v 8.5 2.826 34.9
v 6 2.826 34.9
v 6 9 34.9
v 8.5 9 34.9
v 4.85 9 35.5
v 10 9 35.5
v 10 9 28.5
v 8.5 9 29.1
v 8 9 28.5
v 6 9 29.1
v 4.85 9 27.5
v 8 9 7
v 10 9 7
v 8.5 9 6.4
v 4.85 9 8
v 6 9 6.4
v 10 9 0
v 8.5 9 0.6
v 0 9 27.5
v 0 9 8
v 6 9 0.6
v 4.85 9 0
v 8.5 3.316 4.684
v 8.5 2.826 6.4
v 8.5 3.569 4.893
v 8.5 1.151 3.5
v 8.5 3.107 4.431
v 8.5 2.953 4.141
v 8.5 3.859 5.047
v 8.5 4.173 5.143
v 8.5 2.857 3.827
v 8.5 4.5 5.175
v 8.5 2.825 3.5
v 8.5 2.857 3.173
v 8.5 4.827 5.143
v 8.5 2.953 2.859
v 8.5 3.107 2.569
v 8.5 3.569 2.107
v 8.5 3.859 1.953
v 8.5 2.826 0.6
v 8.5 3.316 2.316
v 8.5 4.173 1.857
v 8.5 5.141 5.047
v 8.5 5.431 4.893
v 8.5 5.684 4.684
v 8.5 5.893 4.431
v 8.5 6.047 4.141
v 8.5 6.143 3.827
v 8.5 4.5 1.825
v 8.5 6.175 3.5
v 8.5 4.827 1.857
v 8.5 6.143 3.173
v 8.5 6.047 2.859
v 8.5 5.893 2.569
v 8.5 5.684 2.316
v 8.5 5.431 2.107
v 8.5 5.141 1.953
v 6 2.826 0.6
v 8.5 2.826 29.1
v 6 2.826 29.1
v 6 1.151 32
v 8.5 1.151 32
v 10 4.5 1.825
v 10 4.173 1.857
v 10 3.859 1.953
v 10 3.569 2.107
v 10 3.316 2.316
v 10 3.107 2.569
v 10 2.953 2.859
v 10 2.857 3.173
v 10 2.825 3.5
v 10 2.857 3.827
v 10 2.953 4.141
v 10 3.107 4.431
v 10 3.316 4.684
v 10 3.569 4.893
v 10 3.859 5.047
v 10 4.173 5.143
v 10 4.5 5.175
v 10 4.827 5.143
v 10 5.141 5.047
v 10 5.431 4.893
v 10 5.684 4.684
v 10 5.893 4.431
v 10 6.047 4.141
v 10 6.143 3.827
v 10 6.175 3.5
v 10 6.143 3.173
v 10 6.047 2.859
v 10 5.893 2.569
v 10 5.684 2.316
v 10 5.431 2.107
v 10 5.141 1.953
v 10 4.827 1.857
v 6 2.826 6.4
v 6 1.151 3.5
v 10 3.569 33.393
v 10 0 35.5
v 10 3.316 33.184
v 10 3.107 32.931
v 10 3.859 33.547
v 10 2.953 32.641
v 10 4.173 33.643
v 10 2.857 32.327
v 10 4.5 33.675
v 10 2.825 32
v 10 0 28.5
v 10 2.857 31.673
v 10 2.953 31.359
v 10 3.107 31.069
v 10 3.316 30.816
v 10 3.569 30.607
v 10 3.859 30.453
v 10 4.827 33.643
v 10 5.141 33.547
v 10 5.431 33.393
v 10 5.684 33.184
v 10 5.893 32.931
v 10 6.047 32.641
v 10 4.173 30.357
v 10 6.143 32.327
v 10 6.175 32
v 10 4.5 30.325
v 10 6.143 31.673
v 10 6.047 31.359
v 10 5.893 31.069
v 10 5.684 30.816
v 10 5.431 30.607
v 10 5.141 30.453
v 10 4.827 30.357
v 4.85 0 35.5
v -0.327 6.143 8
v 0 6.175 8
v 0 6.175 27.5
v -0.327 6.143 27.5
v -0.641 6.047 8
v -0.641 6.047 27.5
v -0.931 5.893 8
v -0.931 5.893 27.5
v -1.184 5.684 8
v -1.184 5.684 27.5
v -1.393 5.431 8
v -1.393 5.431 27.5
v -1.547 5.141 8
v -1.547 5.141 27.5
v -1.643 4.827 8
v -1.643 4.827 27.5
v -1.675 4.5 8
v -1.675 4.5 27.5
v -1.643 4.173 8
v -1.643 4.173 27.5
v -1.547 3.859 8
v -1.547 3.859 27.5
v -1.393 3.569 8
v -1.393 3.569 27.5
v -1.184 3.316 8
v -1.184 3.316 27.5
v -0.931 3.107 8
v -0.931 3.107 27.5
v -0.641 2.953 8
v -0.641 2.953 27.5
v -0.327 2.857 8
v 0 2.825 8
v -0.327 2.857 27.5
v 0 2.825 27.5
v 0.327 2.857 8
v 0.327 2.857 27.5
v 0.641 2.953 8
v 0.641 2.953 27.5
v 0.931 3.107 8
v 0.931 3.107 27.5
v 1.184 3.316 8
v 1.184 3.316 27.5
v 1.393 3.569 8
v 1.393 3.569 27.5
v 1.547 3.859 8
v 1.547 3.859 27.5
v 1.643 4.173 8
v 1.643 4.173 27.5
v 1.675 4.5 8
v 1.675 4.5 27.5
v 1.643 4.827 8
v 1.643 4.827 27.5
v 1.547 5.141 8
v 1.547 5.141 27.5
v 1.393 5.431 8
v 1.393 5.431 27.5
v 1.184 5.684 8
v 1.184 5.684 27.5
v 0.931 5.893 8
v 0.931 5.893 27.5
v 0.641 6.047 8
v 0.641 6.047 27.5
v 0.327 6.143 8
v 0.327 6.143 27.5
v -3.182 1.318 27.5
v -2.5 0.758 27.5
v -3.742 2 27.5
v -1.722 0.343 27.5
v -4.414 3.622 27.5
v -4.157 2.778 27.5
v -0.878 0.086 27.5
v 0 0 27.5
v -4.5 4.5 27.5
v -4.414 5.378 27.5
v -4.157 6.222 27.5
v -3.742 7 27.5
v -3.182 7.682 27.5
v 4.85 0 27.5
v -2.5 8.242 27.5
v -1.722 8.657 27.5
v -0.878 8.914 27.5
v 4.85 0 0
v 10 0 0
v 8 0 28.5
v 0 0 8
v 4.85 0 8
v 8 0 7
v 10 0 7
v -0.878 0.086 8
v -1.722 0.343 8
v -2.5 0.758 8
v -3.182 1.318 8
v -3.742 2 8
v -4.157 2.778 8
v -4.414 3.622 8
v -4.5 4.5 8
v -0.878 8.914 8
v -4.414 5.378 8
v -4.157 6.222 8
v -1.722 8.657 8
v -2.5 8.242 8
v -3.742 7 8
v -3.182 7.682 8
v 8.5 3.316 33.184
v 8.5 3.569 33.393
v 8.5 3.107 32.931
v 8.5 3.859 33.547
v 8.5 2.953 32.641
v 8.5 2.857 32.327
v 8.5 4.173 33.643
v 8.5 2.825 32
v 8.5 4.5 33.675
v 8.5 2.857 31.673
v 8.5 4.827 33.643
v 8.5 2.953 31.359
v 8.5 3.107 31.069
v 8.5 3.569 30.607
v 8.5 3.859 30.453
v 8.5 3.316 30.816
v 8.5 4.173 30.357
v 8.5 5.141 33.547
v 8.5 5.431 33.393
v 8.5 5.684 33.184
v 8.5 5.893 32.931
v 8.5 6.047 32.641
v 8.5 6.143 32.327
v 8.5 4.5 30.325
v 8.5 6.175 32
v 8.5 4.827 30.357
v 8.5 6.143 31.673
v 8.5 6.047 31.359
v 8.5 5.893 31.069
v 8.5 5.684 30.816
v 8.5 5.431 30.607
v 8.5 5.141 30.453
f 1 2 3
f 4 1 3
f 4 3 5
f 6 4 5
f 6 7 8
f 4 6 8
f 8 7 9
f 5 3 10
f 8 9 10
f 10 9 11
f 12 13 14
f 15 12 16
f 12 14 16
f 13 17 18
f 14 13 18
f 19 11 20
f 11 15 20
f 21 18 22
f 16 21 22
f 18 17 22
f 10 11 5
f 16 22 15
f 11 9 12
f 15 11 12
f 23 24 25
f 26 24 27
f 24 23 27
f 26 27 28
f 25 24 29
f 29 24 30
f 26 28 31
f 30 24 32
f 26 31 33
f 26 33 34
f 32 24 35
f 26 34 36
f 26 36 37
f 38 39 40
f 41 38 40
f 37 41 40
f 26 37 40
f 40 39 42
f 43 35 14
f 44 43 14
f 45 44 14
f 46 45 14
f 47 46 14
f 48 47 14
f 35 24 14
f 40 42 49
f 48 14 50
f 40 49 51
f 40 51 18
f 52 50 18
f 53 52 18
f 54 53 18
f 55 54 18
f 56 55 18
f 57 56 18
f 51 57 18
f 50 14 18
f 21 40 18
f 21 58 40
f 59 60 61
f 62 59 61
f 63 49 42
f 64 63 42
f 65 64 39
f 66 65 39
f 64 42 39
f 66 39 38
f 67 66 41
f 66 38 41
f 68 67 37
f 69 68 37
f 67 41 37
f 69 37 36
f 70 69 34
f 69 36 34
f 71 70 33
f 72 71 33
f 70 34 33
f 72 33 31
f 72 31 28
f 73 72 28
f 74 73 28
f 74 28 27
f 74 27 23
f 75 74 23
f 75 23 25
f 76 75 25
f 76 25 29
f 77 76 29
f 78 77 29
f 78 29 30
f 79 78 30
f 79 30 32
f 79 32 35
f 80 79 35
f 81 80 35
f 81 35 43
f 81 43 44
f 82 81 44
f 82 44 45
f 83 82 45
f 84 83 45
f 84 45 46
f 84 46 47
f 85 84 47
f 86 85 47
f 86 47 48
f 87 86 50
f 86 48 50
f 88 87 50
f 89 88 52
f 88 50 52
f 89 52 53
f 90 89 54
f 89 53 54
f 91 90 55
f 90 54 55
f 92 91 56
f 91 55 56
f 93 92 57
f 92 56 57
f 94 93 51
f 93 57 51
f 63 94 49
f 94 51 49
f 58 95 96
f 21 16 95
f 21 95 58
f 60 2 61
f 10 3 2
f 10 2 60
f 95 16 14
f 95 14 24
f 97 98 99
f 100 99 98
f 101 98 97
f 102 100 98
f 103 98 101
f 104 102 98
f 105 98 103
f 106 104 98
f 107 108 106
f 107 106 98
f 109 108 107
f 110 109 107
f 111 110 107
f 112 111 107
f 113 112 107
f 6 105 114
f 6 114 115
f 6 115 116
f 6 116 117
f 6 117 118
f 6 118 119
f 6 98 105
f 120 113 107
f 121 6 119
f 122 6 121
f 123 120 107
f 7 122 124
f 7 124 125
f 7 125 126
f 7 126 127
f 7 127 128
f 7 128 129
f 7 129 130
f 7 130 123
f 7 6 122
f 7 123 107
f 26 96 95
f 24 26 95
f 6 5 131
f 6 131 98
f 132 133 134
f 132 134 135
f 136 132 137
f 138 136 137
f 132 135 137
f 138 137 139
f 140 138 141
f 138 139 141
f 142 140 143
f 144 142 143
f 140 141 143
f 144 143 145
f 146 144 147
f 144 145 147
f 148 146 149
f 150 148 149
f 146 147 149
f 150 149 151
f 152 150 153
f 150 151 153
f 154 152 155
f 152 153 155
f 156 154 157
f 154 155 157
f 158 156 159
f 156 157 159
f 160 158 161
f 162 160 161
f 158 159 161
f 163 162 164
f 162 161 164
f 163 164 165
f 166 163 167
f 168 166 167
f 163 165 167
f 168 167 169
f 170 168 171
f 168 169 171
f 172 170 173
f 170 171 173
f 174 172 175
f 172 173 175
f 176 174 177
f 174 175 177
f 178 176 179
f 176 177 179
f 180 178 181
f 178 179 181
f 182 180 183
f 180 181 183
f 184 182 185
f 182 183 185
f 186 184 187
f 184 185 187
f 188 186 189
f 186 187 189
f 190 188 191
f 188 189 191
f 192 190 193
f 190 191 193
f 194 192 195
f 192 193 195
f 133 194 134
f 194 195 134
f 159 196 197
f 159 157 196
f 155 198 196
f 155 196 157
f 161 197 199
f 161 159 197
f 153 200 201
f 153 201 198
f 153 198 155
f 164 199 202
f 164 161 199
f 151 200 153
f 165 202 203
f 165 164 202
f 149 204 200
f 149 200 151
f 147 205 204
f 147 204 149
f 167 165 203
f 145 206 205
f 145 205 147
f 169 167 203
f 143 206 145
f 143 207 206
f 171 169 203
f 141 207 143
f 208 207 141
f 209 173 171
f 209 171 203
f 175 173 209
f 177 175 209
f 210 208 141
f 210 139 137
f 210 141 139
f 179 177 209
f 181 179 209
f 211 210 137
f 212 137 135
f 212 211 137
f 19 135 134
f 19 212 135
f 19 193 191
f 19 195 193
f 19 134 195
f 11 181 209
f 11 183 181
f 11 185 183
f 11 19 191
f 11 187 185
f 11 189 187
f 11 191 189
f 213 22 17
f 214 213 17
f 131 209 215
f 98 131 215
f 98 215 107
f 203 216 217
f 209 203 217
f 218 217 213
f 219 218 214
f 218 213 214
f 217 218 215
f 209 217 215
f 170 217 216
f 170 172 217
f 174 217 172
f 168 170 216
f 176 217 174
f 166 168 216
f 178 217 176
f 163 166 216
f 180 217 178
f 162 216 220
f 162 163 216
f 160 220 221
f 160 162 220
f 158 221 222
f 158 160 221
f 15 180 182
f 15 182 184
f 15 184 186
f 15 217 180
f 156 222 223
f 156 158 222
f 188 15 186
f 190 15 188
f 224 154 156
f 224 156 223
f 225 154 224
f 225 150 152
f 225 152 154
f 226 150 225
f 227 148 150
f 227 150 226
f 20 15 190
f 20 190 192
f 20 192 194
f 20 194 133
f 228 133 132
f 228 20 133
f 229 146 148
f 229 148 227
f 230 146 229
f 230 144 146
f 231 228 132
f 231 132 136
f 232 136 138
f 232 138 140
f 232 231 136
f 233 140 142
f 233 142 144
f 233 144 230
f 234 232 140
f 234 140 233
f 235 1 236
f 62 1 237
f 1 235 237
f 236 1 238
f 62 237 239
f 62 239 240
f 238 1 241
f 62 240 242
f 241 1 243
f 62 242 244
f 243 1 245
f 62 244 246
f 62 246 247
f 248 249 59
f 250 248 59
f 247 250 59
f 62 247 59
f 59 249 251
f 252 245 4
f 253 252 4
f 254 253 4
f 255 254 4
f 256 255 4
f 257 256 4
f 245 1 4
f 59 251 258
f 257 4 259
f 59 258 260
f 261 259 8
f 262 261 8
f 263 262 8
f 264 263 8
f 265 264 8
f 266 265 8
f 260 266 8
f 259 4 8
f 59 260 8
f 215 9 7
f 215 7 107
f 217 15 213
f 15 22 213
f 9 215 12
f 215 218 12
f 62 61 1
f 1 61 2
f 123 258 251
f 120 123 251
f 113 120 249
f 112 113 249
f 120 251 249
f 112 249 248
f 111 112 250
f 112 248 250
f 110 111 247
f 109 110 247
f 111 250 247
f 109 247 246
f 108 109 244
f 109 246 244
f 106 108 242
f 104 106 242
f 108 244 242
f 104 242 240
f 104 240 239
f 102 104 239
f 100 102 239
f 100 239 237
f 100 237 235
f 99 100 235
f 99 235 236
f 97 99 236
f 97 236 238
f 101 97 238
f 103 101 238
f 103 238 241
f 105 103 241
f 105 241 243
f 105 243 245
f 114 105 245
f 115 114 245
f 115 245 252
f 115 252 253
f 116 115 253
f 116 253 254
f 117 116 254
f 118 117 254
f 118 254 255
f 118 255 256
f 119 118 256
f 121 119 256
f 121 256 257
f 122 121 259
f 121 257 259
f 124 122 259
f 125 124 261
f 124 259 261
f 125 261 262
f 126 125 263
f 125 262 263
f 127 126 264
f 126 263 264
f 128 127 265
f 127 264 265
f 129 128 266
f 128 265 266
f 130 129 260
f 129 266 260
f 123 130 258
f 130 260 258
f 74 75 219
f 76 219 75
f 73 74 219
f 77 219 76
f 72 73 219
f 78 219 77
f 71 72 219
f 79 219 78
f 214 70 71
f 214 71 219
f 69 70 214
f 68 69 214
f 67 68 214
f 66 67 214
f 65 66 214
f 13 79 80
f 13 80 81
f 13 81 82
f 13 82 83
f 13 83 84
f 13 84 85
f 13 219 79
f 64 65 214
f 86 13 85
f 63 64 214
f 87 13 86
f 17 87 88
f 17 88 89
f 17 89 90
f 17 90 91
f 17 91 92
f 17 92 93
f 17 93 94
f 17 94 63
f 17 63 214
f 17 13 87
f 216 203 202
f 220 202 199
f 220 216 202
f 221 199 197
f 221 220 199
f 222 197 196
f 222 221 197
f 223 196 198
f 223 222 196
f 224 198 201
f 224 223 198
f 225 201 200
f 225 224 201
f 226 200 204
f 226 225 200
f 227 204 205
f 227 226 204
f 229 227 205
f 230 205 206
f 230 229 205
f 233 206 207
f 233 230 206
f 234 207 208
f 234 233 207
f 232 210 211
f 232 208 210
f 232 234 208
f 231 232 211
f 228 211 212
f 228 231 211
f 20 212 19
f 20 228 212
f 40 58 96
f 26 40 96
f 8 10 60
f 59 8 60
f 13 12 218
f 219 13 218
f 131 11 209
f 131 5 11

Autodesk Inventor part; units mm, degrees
ref_plane "YZ Plane" through (0, 0, 0) normal (1, 0, 0) x (0, 1, 0)
ref_plane "XZ Plane" through (0, 0, 0) normal (0, 1, 0) x (-1, 0, 0)
ref_plane "XY Plane" through (0, 0, 0) normal (0, 0, 1) x (1, 0, 0)
sketch "Эскиз1" plane through (0, 0, 0) normal (0, 0, 1) x (1, 0, 0)
  line L0 (0, 0) -> (8, 0)
  line L1 (8, 0) -> (8, 9)
  line L2 (8, 9) -> (0, 9)
  line L3 (0, 9) -> (0, 0)
  circle A0 centre (0, 4.5) radius 4.5
  dimension "d0" = 8
  dimension "d1" = 9
extrude "Выдавливание1" add sketch "Эскиз1" along normal blind 35.5
sketch "Эскиз2" plane through (8, 0, 0) normal (1, 0, 0) x (0, 0, -1)
  line L0 (-35.5, 0) -> (-35.5, 9) projected
  line L1 (0, 0) -> (-35.5, 0) projected
  line L2 (-35.5, 9) -> (-28.5, 9)
  line L3 (-28.5, 9) -> (-28.5, 0)
  line L4 (-28.5, 0) -> (-35.5, 0)
  line L5 (-35.5, 0) -> (-35.5, 9)
  line L6 (0, 0) -> (0, 9) projected
  line L7 (0, 9) -> (-7, 9)
  line L8 (-7, 9) -> (-7, 0)
  line L9 (-7, 0) -> (0, 0)
  line L10 (0, 0) -> (0, 9)
  dimension "d4" = 7
  dimension "d5" = 7
extrude "Выдавливание2" add sketch "Эскиз2" along normal blind 2
sketch "Эскиз3" plane through (10, 0, 0) normal (1, 0, 0) x (0, 0, -1)
  line L0 (-35.5, 9) -> (-35.5, 0) projected
  line L1 (-35.5, 4.5) -> (-28.5, 4.5)
  line L2 (-28.5, 0) -> (-28.5, 9) projected
  line L3 (-7, 9) -> (-7, 0) projected
  line L4 (-7, 4.5) -> (0, 4.5)
  line L5 (0, 9) -> (0, 0) projected
  point P0 (-32, 4.5)
  point P1 (-3.5, 4.5)
hole "Отверстие1" at (10, 4.5, 32) at (10, 4.5, 3.5) direction (-1, 0, 0) diameter 3.35 depth 4
sketch "Эскиз4" plane through (10, 0, 0) normal (1, 0, 0) x (0, 0, -1)
  circle A0 centre (-32, 4.5) radius 1.675 projected
  line L0 (-34.9, 6.1743) -> (-32, 7.8486)
  line L1 (-32, 7.8486) -> (-29.1, 6.1743)
  line L2 (-29.1, 6.1743) -> (-29.1, 2.8257)
  line L3 (-29.1, 2.8257) -> (-32, 1.1514)
  line L4 (-32, 1.1514) -> (-34.9, 2.8257)
  line L5 (-34.9, 2.8257) -> (-34.9, 6.1743)
  circle A1 centre (-3.5, 4.5) radius 1.675 projected
  line L6 (-6.4, 6.1743) -> (-3.5, 7.8486)
  line L7 (-3.5, 7.8486) -> (-0.6, 6.1743)
  line L8 (-0.6, 6.1743) -> (-0.6, 2.8257)
  line L9 (-0.6, 2.8257) -> (-3.5, 1.1514)
  line L10 (-3.5, 1.1514) -> (-6.4, 2.8257)
  line L11 (-6.4, 2.8257) -> (-6.4, 6.1743)
  line L12 (0, 9) -> (-35.5, 9) projected
  line L13 (-6.4, 6.1743) -> (-0.6, 6.1743)
  line L14 (-0.6, 6.1743) -> (-0.6, 9)
  line L15 (-0.6, 9) -> (-6.4, 9)
  line L16 (-6.4, 9) -> (-6.4, 6.1743)
  line L17 (-29.1, 6.1743) -> (-34.9, 6.1743)
  line L18 (-34.9, 6.1743) -> (-34.9, 9)
  line L19 (-34.9, 9) -> (-29.1, 9)
  line L20 (-29.1, 9) -> (-29.1, 6.1743)
  point P0 (0, 0)
  dimension "d15" = 5.8
  dimension "d16" = 5.8
extrude "Выдавливание3" cut sketch "Эскиз4" along normal blind 2.5 from surface at -4
sketch "Эскиз5" plane through (0, 0, 35.5) normal (0, 0, 1) x (1, 0, 0)
  line L0 (0, 9) -> (10, 9) projected
  circle A0 centre (0, 4.5) radius 4.5
  arc A1 (0, 9) -> (0, 0) centre (0, 4.5) ccw projected
  line L1 (0, 9) -> (4.85, 9)
  line L2 (4.85, 9) -> (4.85, 0)
  line L3 (4.85, 0) -> (0, 0)
  line L4 (0, 0) -> (0, 9)
  point P0 (0, 0)
  dimension "d40" = 9
  dimension "d41" = 4.85
extrude "Выдавливание4" cut sketch "Эскиз5" against normal blind 8
sketch "Эскиз6" plane through (0, 0, 0) normal (0, 0, -1) x (-1, 0, 0)
  circle A0 centre (0, 4.5) radius 4.5
  line L0 (0, 9) -> (-10, 9) projected
  line L1 (0, 9) -> (-4.85, 9)
  line L2 (-4.85, 9) -> (-4.85, 0)
  line L3 (-4.85, 0) -> (0, 0)
  line L4 (0, 0) -> (0, 9)
  point P0 (0, 0)
  dimension "d42" = 9
  dimension "d43" = 4.85
extrude "Выдавливание5" cut sketch "Эскиз6" against normal blind 8
sketch "Эскиз7" plane through (0, 0, 8) normal (0, 0, -1) x (-1, 0, 0)
  arc A0 (0, 0) -> (0, 9) centre (0, 4.5) ccw projected
hole "Отверстие2" at (0, 4.5, 8) direction (0, 0, 1) diameter 3.35 end through all
equation "\"d16\" = d15"
properties part number "Крепление Open MV"
